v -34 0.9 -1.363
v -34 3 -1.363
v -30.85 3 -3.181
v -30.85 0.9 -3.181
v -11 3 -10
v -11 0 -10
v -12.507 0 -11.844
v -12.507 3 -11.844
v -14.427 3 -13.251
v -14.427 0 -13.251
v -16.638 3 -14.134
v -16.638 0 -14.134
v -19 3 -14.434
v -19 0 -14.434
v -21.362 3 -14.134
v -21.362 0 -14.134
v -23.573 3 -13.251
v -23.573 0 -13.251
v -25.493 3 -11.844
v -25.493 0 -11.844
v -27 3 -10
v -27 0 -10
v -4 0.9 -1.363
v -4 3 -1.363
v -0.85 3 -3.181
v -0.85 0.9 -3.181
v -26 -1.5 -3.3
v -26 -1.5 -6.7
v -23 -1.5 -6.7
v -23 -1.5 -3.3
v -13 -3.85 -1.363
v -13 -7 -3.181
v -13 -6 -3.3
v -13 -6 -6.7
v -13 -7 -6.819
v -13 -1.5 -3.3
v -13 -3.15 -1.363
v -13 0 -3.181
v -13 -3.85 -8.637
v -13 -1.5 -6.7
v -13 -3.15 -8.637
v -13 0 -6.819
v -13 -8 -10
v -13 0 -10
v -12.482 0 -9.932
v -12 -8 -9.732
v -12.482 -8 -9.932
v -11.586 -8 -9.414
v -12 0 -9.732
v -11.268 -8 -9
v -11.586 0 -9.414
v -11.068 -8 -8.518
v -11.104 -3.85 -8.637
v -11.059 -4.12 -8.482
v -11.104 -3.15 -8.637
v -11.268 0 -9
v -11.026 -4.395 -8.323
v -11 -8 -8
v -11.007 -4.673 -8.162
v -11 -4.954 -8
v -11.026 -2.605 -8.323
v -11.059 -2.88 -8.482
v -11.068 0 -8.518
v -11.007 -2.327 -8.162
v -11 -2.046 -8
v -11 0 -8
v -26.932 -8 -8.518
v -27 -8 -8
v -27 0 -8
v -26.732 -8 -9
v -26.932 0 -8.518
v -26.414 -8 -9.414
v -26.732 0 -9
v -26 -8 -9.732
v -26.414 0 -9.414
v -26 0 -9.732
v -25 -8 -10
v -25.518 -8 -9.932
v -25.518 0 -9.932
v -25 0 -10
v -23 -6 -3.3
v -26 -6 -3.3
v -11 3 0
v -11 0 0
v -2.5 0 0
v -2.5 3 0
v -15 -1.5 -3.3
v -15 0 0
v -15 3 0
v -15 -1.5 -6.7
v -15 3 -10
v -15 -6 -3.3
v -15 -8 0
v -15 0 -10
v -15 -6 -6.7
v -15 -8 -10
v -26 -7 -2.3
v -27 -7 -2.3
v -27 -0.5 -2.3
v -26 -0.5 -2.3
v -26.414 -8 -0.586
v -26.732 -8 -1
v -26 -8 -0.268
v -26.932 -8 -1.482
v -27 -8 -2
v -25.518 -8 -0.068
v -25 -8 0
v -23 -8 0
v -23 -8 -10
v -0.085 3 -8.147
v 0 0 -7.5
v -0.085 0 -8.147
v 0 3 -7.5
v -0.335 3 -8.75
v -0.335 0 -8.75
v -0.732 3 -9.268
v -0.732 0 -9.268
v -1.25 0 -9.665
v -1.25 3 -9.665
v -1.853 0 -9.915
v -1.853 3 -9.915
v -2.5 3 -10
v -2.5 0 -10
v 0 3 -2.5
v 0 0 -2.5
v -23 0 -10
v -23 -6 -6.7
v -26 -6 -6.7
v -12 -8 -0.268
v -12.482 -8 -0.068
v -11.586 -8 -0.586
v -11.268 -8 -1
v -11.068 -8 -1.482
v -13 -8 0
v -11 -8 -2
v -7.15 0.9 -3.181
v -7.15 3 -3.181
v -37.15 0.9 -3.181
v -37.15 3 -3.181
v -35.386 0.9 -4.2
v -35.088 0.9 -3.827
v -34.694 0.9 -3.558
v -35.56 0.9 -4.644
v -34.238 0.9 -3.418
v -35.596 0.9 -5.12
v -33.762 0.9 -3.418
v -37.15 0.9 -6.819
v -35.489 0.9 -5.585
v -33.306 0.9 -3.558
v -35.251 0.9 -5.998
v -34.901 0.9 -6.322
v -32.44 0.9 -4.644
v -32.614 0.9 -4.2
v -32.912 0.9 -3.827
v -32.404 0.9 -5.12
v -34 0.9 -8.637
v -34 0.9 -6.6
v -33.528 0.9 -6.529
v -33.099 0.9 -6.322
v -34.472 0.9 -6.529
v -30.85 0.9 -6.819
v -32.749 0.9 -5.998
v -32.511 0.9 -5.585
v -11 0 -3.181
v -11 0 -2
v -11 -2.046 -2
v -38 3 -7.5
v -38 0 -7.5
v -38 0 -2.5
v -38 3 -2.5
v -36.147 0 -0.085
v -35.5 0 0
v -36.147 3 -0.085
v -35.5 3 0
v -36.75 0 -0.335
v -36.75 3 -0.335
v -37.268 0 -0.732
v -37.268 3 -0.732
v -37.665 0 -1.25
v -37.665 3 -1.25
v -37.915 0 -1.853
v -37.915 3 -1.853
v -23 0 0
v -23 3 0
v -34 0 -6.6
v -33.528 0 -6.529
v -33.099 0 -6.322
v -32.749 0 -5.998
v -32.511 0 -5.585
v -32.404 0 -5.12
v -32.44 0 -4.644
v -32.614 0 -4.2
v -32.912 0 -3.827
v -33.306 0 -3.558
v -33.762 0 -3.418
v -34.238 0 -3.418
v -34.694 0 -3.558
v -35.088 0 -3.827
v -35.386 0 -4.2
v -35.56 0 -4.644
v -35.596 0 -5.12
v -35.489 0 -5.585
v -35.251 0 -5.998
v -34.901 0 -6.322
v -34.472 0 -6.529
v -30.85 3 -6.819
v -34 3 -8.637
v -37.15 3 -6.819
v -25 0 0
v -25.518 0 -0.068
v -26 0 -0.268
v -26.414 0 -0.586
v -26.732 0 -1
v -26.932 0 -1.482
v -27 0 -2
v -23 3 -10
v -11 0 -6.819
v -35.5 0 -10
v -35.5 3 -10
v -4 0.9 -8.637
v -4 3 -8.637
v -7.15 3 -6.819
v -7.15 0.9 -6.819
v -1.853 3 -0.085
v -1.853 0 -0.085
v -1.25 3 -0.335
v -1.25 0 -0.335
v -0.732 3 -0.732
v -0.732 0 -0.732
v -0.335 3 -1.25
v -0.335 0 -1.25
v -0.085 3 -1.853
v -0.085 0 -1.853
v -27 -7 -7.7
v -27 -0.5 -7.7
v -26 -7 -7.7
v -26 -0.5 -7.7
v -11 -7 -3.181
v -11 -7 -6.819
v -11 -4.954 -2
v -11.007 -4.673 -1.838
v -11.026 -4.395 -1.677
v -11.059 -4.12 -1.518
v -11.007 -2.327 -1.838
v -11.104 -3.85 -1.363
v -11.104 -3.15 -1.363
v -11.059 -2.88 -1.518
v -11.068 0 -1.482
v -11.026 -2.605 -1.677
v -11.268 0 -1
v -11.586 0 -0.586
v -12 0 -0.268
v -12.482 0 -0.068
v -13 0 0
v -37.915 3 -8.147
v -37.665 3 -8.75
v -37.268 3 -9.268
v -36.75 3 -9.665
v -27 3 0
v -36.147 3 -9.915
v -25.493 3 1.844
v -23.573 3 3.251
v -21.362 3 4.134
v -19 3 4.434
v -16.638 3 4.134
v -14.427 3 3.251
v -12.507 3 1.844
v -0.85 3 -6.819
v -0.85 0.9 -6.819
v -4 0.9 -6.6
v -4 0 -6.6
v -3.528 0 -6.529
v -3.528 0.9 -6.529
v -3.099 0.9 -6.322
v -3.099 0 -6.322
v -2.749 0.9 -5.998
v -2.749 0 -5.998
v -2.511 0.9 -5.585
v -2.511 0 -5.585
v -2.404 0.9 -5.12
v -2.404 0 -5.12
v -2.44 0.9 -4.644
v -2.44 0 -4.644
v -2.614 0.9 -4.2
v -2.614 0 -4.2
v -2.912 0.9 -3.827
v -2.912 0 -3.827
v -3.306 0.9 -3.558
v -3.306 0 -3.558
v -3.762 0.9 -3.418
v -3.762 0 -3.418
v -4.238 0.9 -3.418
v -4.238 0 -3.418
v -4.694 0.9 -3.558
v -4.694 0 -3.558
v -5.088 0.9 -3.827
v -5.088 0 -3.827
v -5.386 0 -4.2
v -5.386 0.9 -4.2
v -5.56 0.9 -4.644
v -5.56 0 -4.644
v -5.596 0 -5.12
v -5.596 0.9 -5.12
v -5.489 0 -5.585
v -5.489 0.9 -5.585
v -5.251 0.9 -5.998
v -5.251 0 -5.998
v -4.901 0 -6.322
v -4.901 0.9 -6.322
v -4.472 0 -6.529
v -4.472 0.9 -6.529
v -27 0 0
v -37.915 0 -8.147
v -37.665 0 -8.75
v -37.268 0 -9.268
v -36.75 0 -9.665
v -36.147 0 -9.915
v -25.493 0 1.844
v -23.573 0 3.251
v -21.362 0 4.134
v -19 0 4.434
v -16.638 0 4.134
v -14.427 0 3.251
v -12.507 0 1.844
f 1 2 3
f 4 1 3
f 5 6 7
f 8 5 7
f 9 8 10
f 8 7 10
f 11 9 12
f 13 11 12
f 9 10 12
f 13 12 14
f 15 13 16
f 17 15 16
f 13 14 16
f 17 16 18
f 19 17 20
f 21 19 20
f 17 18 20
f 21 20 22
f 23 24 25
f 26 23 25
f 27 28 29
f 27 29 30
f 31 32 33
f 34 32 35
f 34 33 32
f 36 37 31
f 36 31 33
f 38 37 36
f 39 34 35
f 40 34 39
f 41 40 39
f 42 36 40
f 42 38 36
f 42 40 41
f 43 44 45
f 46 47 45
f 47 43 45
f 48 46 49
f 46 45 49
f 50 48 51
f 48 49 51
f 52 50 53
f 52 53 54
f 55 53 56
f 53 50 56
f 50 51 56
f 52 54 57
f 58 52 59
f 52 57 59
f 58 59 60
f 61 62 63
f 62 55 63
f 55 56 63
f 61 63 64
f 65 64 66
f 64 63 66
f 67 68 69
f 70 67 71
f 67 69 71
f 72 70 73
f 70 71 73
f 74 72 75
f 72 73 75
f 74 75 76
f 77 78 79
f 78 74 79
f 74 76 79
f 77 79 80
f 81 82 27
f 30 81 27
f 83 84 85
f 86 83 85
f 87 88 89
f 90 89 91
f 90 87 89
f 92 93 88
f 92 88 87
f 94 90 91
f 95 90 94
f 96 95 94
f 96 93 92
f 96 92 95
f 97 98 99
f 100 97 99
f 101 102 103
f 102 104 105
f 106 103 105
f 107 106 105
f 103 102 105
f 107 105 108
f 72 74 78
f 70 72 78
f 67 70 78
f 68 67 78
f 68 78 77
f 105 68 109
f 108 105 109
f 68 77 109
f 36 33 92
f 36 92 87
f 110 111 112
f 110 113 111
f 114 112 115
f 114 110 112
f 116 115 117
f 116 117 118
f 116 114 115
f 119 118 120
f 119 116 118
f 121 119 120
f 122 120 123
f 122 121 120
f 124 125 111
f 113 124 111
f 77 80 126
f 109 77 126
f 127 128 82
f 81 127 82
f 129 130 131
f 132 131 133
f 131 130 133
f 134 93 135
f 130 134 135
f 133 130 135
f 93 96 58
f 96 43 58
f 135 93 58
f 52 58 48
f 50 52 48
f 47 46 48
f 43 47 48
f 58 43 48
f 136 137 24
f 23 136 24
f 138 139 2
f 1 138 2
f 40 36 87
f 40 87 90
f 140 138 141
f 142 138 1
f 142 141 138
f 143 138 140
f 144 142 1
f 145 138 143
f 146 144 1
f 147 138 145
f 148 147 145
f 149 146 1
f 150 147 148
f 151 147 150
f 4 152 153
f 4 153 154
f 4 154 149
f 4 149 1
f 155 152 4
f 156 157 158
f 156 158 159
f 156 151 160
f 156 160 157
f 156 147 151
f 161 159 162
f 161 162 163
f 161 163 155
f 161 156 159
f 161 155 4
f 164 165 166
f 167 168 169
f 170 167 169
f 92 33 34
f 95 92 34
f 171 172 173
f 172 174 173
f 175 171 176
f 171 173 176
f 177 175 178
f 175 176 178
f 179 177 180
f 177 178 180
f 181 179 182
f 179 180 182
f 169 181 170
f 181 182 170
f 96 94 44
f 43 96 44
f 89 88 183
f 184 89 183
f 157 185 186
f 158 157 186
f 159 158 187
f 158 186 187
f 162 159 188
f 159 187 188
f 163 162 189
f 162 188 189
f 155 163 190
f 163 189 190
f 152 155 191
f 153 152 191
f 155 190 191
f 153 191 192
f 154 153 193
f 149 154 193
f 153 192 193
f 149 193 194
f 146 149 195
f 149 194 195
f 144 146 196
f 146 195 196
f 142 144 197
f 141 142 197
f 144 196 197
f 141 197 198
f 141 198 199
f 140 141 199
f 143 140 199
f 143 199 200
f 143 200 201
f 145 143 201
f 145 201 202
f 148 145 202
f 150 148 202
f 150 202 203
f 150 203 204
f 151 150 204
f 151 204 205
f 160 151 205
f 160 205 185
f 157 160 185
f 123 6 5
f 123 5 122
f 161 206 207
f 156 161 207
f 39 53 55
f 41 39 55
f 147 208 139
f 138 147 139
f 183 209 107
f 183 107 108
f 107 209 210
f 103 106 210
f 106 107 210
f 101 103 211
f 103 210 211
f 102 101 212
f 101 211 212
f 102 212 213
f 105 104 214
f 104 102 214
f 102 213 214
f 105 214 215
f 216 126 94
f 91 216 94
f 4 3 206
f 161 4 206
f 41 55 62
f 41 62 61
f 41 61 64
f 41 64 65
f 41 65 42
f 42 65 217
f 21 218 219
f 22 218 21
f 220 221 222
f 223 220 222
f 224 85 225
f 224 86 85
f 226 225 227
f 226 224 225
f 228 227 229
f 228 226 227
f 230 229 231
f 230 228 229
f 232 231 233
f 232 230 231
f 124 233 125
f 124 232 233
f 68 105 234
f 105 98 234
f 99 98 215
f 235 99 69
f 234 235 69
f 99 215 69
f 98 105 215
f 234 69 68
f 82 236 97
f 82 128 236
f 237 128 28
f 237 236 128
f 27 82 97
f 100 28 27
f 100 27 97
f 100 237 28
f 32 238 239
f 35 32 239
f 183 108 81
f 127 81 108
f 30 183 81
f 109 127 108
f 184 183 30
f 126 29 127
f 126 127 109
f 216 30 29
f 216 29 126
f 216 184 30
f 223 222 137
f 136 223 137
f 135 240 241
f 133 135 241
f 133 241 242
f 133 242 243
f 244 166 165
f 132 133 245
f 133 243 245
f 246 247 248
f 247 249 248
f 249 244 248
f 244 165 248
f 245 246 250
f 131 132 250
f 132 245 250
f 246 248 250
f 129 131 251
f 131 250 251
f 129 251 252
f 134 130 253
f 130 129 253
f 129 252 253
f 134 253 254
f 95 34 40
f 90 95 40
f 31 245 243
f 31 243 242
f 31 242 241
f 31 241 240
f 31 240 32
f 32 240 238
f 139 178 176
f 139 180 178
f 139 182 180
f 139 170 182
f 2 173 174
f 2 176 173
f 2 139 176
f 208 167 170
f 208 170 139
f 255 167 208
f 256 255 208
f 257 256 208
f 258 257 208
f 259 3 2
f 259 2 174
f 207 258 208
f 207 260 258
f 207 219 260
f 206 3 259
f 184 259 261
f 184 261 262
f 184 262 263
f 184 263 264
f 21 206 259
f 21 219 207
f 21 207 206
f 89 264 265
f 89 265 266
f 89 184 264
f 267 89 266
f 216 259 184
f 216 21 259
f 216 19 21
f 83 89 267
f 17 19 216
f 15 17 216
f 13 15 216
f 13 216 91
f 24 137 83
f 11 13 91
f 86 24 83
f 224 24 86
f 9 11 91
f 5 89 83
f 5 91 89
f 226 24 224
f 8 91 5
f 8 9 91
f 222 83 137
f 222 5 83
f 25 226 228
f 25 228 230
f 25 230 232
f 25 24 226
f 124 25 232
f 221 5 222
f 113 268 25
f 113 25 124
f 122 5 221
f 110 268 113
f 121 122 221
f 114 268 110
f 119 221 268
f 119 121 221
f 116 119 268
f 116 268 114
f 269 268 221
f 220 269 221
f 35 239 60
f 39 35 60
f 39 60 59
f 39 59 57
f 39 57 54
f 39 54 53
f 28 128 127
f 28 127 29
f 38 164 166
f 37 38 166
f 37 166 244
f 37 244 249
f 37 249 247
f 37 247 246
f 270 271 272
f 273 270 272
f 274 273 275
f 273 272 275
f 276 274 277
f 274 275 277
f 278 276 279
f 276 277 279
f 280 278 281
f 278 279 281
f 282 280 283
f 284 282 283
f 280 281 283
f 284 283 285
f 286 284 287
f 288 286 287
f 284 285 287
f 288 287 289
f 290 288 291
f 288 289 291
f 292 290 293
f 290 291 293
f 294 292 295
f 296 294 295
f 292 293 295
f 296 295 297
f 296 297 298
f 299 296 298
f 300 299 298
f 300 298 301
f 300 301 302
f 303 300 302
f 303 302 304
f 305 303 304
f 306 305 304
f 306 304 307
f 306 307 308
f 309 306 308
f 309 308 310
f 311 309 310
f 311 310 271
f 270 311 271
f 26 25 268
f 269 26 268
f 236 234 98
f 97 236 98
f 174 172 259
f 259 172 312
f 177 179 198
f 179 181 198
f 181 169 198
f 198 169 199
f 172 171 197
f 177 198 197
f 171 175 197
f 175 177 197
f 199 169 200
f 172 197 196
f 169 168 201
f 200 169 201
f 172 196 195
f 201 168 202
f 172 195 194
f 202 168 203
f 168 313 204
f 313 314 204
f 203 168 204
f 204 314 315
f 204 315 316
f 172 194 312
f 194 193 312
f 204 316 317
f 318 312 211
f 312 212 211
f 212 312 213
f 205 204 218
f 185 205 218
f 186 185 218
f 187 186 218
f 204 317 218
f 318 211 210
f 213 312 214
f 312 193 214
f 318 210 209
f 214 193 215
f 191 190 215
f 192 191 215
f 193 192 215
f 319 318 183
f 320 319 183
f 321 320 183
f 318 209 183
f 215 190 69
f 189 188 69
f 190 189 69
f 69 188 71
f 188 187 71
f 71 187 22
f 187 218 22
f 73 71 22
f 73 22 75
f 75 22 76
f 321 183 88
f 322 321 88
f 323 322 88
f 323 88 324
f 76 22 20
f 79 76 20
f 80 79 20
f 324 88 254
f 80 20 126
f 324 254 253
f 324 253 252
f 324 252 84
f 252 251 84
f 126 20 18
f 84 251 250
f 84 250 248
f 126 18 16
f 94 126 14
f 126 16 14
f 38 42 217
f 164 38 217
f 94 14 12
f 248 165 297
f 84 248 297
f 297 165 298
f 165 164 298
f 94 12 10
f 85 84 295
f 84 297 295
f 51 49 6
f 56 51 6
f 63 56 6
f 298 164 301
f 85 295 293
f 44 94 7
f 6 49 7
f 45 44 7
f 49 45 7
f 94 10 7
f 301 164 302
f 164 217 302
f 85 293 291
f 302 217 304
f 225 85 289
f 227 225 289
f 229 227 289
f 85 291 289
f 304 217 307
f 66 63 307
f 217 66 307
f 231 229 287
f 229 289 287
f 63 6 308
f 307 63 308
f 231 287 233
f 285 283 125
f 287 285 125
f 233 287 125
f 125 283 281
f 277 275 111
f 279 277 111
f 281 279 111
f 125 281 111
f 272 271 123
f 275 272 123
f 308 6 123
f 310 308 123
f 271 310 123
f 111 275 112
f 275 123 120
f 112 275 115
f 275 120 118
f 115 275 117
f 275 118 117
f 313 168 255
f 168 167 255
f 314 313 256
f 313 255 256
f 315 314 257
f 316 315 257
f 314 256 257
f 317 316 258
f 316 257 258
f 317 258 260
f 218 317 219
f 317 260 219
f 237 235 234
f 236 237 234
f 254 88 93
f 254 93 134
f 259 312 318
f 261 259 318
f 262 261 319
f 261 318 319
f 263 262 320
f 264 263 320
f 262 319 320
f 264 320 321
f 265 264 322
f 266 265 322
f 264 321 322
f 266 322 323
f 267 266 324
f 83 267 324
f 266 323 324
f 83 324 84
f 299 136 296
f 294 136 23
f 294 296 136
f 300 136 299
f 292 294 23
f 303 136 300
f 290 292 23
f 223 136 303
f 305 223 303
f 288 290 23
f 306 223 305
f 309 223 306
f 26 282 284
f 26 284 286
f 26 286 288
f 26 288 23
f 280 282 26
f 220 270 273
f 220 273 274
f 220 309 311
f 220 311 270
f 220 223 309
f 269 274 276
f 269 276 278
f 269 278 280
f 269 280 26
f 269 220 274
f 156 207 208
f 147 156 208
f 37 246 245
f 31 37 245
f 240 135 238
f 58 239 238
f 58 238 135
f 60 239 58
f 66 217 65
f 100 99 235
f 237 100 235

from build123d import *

# Parameters (mm, degrees)
SKETCH1_W           = 11
SKETCH1_H           = 8
SKETCH1_W_2         = 4
SKETCH1_H_2         = 10
SKETCH1_H_3         = 1
BOSS_EXTRUDE1_DEPTH = 3
SKETCH1_3_W         = 4
SKETCH1_3_H         = 10
BOSS_EXTRUDE2_DEPTH = 8
CUT_EXTRUDE5_DEPTH  = 2.1
HOLE1_D             = 3.2
SKETCH5_W           = 3.4
SKETCH5_H           = 4.5
CUT_EXTRUDE1_DEPTH  = 4
CUT_EXTRUDE4_DEPTH  = 1
SKETCH6_W           = 3.4
SKETCH6_H           = 4.5
CUT_EXTRUDE2_DEPTH  = 2
SKETCH6_3_W         = 3.4
SKETCH6_3_H         = 4.5
CUT_EXTRUDE3_DEPTH  = 32.643953788
FILLET1_R           = 2.5
FILLET2_R           = 2


with BuildPart() as part:
    # Sketch1 → Boss-Extrude1 (new body)
    with BuildSketch(Plane(origin=(0, 0, 0), x_dir=(1, 0, 0), z_dir=(0, 1, 0))):
        with Locations((-32.5, 5)):
            Rectangle(SKETCH1_W, SKETCH1_H)
        Polygon((-23, 10), (-27, 10), (-27, 9), (-27, 1), (-27, 0), (-23, 0), align=None)
        with BuildLine():
            ThreePointArc((-11, 10), (-19, 14.433981132), (-27, 10))
            Line((-27, 10), (-23, 10))
            Line((-23, 10), (-15, 10))
            Line((-15, 10), (-11, 10))
        make_face()
        with Locations((-13, 5)):
            Rectangle(SKETCH1_W_2, SKETCH1_H_2)
        with BuildLine():
            Line((-15, 0), (-23, 0))
            Line((-23, 0), (-27, 0))
            ThreePointArc((-27, 0), (-19, -4.433981132), (-11, 0))
            Line((-11, 0), (-15, 0))
        make_face()
        with Locations((-5.5, 5)):
            Rectangle(SKETCH1_W, SKETCH1_H_2)
        with Locations((-32.5, 9.5)):
            Rectangle(SKETCH1_W, SKETCH1_H_3)
        with Locations((-32.5, 0.5)):
            Rectangle(SKETCH1_W, SKETCH1_H_3)
    extrude(amount=BOSS_EXTRUDE1_DEPTH)

    # Sketch1<3> → Boss-Extrude2 (add)
    with BuildSketch(Plane(origin=(0, 0, 0), x_dir=(1, 0, 0), z_dir=(0, 1, 0))):
        with Locations((-25, 5)):
            Rectangle(SKETCH1_3_W, SKETCH1_3_H)
        with Locations((-13, 5)):
            Rectangle(SKETCH1_3_W, SKETCH1_3_H)
    extrude(amount=-BOSS_EXTRUDE2_DEPTH)

    # Sketch3 → Cut-Extrude5 (cut)
    with BuildSketch(Plane(origin=(0, 3, 0), x_dir=(1, 0, 0), z_dir=(0, 1, 0))):
        Polygon((-7.15, 6.818653348), (-7.15, 3.181346652), (-4, 1.362693304), (-0.85, 3.181346652), (-0.85, 6.818653348), (-4, 8.637306696), align=None)
        Polygon((-30.85, 3.181346652), (-30.85, 6.818653348), (-34, 8.637306696), (-37.15, 6.818653348), (-37.15, 3.181346652), (-34, 1.362693304), align=None)
    extrude(amount=-CUT_EXTRUDE5_DEPTH, mode=Mode.SUBTRACT)

    # Hole1 (through all)
    with Locations(Plane(origin=(-4, 3, -5), x_dir=(0, 0, 1), z_dir=(0, 1, 0))):
        with Locations((0, 0), (0, -30)):
            Hole(HOLE1_D / 2)

    # Sketch5 → Cut-Extrude1 (cut)
    with BuildSketch(Plane.ZY.offset(27)):
        with Locations((-5, -3.75)):
            Rectangle(SKETCH5_W, SKETCH5_H)
    extrude(amount=-CUT_EXTRUDE1_DEPTH, mode=Mode.SUBTRACT)

    # Sketch5<4> → Cut-Extrude4 (cut)
    with BuildSketch(Plane.ZY.offset(27)):
        Polygon((-5, -1.5), (-5, -0.5), (-7.7, -0.5), (-7.7, -7), (-5, -7), (-5, -6), (-6.7, -6), (-6.7, -1.5), align=None)
        Polygon((-2.3, -0.5), (-5, -0.5), (-5, -1.5), (-3.3, -1.5), (-3.3, -6), (-5, -6), (-5, -7), (-2.3, -7), align=None)
    extrude(amount=-CUT_EXTRUDE4_DEPTH, mode=Mode.SUBTRACT)

    # Sketch6 → Cut-Extrude2 (cut)
    # profile 1 of 5: a face of its own
    with BuildSketch(Plane(origin=(-11, 0, 0), x_dir=(0, 0, -1), z_dir=(1, 0, 0))):
        Polygon((3.181346652, -6.3), (6.818653348, -6.3), (8.435234102, -3.5), (6.818653348, -0.7), (3.181346652, -0.7), (1.564765898, -3.5), align=None)
        with Locations((5, -3.75)):
            Rectangle(SKETCH6_W, SKETCH6_H, mode=Mode.SUBTRACT)
    # profile 2 of 5: a face of its own
    with BuildSketch(Plane(origin=(-11, 0, 0), x_dir=(0, 0, -1), z_dir=(1, 0, 0))):
        Polygon((8.435234102, -3.5), (6.818653348, -6.3), (3.181346652, -6.3), (1.564765898, -3.5), (1.362693304, -3.85), (3.181346652, -7), (6.818653348, -7), (8.637306696, -3.85), align=None)
    # profile 3 of 5: a face of its own
    with BuildSketch(Plane(origin=(-11, 0, 0), x_dir=(0, 0, -1), z_dir=(1, 0, 0))):
        Polygon((6.818653348, -0.7), (8.435234102, -3.5), (8.637306696, -3.15), (6.818653348, 0), (3.181346652, 0), (1.362693304, -3.15), (1.564765898, -3.5), (3.181346652, -0.7), align=None)
    # profile 4 of 5: a face of its own
    with BuildSketch(Plane(origin=(-11, 0, 0), x_dir=(0, 0, -1), z_dir=(1, 0, 0))):
        Polygon((8.637306696, -3.15), (8.435234102, -3.5), (8.637306696, -3.85), align=None)
    # profile 5 of 5: a face of its own
    with BuildSketch(Plane(origin=(-11, 0, 0), x_dir=(0, 0, -1), z_dir=(1, 0, 0))):
        Polygon((1.362693304, -3.85), (1.564765898, -3.5), (1.362693304, -3.15), align=None)
    extrude(amount=-CUT_EXTRUDE2_DEPTH, mode=Mode.SUBTRACT)

    # Sketch6<3> → Cut-Extrude3 (cut, through all)
    with BuildSketch(Plane(origin=(-11, 0, 0), x_dir=(0, 0, -1), z_dir=(1, 0, 0))):
        with Locations((5, -3.75)):
            Rectangle(SKETCH6_3_W, SKETCH6_3_H)
    extrude(amount=-CUT_EXTRUDE3_DEPTH, mode=Mode.SUBTRACT)

    # Fillet1
    fillet1_edges = [part.edges().sort_by_distance(p)[0] for p in [
        (-38, 1.5, 0),
        (-38, 1.5, -10),
        (0, 1.5, -10),
        (0, 1.5, 0),
    ]]
    fillet(fillet1_edges, radius=FILLET1_R)

    # Fillet2
    # the kernel refuses this fillet: 2 mm, written as the material it takes off along each edge
    with BuildSketch(Plane(origin=(-11, 0, 0), x_dir=(-1, 0, 0), z_dir=(0, -1, 0)), Plane(origin=(-27, 0, -10), x_dir=(1, 0, 0), z_dir=(0, -1, 0))) as fillet2_piece_1:
        with BuildLine():
            CenterArc((FILLET2_R, FILLET2_R), FILLET2_R, 180, 90)
            Line((0, FILLET2_R), (0, 0))
            Line((0, 0), (FILLET2_R, 0))
        make_face()
    extrude(amount=13, mode=Mode.SUBTRACT)
    with BuildSketch(Plane(origin=(-11, 0, -10), x_dir=(-1, 0, 0), z_dir=(0, -1, 0)), Plane(origin=(-27, 0, 0), x_dir=(1, 0, 0), z_dir=(0, -1, 0))) as fillet2_piece_2:
        with BuildLine():
            CenterArc((FILLET2_R, -FILLET2_R), FILLET2_R, 90, 90)
            Line((0, -FILLET2_R), (0, 0))
            Line((0, 0), (FILLET2_R, 0))
        make_face()
    extrude(amount=13, mode=Mode.SUBTRACT)


solid = part.part
